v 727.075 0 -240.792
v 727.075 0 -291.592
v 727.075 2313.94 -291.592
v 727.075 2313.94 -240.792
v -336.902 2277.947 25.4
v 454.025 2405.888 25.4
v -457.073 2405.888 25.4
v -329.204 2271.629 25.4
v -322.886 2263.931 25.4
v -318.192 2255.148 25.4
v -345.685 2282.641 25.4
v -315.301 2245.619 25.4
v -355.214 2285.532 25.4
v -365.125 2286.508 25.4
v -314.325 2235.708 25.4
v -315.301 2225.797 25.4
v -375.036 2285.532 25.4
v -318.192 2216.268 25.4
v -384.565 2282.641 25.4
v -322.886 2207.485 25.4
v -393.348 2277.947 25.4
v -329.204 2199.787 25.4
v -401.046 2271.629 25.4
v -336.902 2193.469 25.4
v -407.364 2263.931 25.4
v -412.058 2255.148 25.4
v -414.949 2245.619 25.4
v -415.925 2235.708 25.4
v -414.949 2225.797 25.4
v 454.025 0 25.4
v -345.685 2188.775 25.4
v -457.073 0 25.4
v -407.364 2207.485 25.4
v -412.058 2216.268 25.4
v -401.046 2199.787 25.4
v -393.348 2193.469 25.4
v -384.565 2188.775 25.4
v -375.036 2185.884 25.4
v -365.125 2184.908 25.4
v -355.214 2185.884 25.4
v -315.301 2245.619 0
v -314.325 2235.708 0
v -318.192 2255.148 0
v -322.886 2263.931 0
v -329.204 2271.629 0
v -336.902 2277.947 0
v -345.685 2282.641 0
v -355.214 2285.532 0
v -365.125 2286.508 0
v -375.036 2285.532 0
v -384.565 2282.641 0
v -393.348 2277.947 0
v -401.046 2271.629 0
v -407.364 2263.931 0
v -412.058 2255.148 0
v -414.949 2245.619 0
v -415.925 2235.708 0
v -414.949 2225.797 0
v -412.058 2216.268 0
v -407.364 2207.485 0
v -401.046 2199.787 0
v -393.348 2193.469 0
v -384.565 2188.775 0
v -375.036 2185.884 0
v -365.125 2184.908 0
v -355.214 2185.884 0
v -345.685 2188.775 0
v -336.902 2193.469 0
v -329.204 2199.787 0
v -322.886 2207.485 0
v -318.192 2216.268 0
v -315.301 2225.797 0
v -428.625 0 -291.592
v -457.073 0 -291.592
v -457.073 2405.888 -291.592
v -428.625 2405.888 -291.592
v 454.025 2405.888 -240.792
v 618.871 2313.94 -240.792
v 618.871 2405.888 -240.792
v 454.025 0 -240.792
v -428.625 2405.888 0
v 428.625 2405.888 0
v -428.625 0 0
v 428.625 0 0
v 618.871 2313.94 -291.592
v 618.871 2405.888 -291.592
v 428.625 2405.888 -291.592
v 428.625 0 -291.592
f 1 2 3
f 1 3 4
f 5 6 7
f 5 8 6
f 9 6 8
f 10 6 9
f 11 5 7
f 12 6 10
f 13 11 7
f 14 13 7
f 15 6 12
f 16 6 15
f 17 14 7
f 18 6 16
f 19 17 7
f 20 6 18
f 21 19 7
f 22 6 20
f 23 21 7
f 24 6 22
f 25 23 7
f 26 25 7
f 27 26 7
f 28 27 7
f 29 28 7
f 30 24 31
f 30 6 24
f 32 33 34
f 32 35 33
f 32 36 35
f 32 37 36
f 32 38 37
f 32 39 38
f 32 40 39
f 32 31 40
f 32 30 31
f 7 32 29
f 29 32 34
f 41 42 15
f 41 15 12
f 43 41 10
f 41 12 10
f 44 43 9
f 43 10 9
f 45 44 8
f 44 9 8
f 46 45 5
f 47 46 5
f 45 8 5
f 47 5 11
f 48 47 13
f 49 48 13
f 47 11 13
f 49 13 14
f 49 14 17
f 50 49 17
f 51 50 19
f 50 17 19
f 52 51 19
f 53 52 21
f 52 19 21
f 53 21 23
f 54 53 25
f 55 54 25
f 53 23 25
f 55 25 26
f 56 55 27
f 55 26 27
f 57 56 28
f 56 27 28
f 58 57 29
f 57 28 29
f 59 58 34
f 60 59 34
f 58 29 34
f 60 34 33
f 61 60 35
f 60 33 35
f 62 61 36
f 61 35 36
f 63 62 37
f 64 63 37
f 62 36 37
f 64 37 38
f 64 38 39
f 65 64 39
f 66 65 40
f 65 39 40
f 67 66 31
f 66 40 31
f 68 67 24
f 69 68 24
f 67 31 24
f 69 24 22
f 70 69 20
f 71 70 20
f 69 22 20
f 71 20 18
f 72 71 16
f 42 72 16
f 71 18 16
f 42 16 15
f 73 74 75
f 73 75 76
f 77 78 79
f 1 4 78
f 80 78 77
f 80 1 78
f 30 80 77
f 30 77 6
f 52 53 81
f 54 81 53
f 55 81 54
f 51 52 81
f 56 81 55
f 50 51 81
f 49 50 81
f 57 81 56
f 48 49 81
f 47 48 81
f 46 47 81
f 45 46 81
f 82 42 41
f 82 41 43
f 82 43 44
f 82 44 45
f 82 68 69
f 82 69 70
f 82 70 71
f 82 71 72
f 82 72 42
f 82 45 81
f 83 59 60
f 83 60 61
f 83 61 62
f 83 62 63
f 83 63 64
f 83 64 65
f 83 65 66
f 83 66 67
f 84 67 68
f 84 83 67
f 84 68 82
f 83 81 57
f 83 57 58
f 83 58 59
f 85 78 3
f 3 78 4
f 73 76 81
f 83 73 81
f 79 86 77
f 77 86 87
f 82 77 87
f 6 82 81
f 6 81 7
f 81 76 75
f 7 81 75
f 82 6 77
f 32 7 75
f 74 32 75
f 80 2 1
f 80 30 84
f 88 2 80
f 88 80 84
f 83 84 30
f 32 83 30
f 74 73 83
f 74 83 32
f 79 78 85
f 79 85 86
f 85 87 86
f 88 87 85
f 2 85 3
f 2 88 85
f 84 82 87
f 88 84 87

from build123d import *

# Parameters (mm, degrees)
BOSS_EXTRUDE1_DEPTH = 2405.888
SKETCH3_W           = 108.204
SKETCH3_H           = 91.948
CUT_EXTRUDE1_DEPTH  = 50.8
SKETCH4_R           = 50.8
CUT_EXTRUDE2_DEPTH  = 25.4


with BuildPart() as part:
    # Sketch2 → Boss-Extrude1 (new body)
    with BuildSketch(Plane(origin=(0, 0, 0), x_dir=(1, 0, 0), z_dir=(0, 1, 0))):
        Polygon((-457.073, 291.592), (-428.625, 291.592), (-428.625, 0), (428.625, 0), (428.625, 291.592), (727.075, 291.592), (727.075, 240.792), (454.025, 240.792), (454.025, -25.4), (-457.073, -25.4), align=None)
    extrude(amount=BOSS_EXTRUDE1_DEPTH)

    # Sketch3 → Cut-Extrude1 (cut)
    with BuildSketch(Plane.XY.offset(-240.792)):
        with Locations((672.973, 2359.914)):
            Rectangle(SKETCH3_W, SKETCH3_H)
    extrude(amount=-CUT_EXTRUDE1_DEPTH, mode=Mode.SUBTRACT)

    # Sketch4 → Cut-Extrude2 (cut)
    with BuildSketch(Plane.XY.offset(25.4)):
        with Locations((-365.125, 2235.708)):
            Circle(SKETCH4_R)
    extrude(amount=-CUT_EXTRUDE2_DEPTH, mode=Mode.SUBTRACT)


solid = part.part
